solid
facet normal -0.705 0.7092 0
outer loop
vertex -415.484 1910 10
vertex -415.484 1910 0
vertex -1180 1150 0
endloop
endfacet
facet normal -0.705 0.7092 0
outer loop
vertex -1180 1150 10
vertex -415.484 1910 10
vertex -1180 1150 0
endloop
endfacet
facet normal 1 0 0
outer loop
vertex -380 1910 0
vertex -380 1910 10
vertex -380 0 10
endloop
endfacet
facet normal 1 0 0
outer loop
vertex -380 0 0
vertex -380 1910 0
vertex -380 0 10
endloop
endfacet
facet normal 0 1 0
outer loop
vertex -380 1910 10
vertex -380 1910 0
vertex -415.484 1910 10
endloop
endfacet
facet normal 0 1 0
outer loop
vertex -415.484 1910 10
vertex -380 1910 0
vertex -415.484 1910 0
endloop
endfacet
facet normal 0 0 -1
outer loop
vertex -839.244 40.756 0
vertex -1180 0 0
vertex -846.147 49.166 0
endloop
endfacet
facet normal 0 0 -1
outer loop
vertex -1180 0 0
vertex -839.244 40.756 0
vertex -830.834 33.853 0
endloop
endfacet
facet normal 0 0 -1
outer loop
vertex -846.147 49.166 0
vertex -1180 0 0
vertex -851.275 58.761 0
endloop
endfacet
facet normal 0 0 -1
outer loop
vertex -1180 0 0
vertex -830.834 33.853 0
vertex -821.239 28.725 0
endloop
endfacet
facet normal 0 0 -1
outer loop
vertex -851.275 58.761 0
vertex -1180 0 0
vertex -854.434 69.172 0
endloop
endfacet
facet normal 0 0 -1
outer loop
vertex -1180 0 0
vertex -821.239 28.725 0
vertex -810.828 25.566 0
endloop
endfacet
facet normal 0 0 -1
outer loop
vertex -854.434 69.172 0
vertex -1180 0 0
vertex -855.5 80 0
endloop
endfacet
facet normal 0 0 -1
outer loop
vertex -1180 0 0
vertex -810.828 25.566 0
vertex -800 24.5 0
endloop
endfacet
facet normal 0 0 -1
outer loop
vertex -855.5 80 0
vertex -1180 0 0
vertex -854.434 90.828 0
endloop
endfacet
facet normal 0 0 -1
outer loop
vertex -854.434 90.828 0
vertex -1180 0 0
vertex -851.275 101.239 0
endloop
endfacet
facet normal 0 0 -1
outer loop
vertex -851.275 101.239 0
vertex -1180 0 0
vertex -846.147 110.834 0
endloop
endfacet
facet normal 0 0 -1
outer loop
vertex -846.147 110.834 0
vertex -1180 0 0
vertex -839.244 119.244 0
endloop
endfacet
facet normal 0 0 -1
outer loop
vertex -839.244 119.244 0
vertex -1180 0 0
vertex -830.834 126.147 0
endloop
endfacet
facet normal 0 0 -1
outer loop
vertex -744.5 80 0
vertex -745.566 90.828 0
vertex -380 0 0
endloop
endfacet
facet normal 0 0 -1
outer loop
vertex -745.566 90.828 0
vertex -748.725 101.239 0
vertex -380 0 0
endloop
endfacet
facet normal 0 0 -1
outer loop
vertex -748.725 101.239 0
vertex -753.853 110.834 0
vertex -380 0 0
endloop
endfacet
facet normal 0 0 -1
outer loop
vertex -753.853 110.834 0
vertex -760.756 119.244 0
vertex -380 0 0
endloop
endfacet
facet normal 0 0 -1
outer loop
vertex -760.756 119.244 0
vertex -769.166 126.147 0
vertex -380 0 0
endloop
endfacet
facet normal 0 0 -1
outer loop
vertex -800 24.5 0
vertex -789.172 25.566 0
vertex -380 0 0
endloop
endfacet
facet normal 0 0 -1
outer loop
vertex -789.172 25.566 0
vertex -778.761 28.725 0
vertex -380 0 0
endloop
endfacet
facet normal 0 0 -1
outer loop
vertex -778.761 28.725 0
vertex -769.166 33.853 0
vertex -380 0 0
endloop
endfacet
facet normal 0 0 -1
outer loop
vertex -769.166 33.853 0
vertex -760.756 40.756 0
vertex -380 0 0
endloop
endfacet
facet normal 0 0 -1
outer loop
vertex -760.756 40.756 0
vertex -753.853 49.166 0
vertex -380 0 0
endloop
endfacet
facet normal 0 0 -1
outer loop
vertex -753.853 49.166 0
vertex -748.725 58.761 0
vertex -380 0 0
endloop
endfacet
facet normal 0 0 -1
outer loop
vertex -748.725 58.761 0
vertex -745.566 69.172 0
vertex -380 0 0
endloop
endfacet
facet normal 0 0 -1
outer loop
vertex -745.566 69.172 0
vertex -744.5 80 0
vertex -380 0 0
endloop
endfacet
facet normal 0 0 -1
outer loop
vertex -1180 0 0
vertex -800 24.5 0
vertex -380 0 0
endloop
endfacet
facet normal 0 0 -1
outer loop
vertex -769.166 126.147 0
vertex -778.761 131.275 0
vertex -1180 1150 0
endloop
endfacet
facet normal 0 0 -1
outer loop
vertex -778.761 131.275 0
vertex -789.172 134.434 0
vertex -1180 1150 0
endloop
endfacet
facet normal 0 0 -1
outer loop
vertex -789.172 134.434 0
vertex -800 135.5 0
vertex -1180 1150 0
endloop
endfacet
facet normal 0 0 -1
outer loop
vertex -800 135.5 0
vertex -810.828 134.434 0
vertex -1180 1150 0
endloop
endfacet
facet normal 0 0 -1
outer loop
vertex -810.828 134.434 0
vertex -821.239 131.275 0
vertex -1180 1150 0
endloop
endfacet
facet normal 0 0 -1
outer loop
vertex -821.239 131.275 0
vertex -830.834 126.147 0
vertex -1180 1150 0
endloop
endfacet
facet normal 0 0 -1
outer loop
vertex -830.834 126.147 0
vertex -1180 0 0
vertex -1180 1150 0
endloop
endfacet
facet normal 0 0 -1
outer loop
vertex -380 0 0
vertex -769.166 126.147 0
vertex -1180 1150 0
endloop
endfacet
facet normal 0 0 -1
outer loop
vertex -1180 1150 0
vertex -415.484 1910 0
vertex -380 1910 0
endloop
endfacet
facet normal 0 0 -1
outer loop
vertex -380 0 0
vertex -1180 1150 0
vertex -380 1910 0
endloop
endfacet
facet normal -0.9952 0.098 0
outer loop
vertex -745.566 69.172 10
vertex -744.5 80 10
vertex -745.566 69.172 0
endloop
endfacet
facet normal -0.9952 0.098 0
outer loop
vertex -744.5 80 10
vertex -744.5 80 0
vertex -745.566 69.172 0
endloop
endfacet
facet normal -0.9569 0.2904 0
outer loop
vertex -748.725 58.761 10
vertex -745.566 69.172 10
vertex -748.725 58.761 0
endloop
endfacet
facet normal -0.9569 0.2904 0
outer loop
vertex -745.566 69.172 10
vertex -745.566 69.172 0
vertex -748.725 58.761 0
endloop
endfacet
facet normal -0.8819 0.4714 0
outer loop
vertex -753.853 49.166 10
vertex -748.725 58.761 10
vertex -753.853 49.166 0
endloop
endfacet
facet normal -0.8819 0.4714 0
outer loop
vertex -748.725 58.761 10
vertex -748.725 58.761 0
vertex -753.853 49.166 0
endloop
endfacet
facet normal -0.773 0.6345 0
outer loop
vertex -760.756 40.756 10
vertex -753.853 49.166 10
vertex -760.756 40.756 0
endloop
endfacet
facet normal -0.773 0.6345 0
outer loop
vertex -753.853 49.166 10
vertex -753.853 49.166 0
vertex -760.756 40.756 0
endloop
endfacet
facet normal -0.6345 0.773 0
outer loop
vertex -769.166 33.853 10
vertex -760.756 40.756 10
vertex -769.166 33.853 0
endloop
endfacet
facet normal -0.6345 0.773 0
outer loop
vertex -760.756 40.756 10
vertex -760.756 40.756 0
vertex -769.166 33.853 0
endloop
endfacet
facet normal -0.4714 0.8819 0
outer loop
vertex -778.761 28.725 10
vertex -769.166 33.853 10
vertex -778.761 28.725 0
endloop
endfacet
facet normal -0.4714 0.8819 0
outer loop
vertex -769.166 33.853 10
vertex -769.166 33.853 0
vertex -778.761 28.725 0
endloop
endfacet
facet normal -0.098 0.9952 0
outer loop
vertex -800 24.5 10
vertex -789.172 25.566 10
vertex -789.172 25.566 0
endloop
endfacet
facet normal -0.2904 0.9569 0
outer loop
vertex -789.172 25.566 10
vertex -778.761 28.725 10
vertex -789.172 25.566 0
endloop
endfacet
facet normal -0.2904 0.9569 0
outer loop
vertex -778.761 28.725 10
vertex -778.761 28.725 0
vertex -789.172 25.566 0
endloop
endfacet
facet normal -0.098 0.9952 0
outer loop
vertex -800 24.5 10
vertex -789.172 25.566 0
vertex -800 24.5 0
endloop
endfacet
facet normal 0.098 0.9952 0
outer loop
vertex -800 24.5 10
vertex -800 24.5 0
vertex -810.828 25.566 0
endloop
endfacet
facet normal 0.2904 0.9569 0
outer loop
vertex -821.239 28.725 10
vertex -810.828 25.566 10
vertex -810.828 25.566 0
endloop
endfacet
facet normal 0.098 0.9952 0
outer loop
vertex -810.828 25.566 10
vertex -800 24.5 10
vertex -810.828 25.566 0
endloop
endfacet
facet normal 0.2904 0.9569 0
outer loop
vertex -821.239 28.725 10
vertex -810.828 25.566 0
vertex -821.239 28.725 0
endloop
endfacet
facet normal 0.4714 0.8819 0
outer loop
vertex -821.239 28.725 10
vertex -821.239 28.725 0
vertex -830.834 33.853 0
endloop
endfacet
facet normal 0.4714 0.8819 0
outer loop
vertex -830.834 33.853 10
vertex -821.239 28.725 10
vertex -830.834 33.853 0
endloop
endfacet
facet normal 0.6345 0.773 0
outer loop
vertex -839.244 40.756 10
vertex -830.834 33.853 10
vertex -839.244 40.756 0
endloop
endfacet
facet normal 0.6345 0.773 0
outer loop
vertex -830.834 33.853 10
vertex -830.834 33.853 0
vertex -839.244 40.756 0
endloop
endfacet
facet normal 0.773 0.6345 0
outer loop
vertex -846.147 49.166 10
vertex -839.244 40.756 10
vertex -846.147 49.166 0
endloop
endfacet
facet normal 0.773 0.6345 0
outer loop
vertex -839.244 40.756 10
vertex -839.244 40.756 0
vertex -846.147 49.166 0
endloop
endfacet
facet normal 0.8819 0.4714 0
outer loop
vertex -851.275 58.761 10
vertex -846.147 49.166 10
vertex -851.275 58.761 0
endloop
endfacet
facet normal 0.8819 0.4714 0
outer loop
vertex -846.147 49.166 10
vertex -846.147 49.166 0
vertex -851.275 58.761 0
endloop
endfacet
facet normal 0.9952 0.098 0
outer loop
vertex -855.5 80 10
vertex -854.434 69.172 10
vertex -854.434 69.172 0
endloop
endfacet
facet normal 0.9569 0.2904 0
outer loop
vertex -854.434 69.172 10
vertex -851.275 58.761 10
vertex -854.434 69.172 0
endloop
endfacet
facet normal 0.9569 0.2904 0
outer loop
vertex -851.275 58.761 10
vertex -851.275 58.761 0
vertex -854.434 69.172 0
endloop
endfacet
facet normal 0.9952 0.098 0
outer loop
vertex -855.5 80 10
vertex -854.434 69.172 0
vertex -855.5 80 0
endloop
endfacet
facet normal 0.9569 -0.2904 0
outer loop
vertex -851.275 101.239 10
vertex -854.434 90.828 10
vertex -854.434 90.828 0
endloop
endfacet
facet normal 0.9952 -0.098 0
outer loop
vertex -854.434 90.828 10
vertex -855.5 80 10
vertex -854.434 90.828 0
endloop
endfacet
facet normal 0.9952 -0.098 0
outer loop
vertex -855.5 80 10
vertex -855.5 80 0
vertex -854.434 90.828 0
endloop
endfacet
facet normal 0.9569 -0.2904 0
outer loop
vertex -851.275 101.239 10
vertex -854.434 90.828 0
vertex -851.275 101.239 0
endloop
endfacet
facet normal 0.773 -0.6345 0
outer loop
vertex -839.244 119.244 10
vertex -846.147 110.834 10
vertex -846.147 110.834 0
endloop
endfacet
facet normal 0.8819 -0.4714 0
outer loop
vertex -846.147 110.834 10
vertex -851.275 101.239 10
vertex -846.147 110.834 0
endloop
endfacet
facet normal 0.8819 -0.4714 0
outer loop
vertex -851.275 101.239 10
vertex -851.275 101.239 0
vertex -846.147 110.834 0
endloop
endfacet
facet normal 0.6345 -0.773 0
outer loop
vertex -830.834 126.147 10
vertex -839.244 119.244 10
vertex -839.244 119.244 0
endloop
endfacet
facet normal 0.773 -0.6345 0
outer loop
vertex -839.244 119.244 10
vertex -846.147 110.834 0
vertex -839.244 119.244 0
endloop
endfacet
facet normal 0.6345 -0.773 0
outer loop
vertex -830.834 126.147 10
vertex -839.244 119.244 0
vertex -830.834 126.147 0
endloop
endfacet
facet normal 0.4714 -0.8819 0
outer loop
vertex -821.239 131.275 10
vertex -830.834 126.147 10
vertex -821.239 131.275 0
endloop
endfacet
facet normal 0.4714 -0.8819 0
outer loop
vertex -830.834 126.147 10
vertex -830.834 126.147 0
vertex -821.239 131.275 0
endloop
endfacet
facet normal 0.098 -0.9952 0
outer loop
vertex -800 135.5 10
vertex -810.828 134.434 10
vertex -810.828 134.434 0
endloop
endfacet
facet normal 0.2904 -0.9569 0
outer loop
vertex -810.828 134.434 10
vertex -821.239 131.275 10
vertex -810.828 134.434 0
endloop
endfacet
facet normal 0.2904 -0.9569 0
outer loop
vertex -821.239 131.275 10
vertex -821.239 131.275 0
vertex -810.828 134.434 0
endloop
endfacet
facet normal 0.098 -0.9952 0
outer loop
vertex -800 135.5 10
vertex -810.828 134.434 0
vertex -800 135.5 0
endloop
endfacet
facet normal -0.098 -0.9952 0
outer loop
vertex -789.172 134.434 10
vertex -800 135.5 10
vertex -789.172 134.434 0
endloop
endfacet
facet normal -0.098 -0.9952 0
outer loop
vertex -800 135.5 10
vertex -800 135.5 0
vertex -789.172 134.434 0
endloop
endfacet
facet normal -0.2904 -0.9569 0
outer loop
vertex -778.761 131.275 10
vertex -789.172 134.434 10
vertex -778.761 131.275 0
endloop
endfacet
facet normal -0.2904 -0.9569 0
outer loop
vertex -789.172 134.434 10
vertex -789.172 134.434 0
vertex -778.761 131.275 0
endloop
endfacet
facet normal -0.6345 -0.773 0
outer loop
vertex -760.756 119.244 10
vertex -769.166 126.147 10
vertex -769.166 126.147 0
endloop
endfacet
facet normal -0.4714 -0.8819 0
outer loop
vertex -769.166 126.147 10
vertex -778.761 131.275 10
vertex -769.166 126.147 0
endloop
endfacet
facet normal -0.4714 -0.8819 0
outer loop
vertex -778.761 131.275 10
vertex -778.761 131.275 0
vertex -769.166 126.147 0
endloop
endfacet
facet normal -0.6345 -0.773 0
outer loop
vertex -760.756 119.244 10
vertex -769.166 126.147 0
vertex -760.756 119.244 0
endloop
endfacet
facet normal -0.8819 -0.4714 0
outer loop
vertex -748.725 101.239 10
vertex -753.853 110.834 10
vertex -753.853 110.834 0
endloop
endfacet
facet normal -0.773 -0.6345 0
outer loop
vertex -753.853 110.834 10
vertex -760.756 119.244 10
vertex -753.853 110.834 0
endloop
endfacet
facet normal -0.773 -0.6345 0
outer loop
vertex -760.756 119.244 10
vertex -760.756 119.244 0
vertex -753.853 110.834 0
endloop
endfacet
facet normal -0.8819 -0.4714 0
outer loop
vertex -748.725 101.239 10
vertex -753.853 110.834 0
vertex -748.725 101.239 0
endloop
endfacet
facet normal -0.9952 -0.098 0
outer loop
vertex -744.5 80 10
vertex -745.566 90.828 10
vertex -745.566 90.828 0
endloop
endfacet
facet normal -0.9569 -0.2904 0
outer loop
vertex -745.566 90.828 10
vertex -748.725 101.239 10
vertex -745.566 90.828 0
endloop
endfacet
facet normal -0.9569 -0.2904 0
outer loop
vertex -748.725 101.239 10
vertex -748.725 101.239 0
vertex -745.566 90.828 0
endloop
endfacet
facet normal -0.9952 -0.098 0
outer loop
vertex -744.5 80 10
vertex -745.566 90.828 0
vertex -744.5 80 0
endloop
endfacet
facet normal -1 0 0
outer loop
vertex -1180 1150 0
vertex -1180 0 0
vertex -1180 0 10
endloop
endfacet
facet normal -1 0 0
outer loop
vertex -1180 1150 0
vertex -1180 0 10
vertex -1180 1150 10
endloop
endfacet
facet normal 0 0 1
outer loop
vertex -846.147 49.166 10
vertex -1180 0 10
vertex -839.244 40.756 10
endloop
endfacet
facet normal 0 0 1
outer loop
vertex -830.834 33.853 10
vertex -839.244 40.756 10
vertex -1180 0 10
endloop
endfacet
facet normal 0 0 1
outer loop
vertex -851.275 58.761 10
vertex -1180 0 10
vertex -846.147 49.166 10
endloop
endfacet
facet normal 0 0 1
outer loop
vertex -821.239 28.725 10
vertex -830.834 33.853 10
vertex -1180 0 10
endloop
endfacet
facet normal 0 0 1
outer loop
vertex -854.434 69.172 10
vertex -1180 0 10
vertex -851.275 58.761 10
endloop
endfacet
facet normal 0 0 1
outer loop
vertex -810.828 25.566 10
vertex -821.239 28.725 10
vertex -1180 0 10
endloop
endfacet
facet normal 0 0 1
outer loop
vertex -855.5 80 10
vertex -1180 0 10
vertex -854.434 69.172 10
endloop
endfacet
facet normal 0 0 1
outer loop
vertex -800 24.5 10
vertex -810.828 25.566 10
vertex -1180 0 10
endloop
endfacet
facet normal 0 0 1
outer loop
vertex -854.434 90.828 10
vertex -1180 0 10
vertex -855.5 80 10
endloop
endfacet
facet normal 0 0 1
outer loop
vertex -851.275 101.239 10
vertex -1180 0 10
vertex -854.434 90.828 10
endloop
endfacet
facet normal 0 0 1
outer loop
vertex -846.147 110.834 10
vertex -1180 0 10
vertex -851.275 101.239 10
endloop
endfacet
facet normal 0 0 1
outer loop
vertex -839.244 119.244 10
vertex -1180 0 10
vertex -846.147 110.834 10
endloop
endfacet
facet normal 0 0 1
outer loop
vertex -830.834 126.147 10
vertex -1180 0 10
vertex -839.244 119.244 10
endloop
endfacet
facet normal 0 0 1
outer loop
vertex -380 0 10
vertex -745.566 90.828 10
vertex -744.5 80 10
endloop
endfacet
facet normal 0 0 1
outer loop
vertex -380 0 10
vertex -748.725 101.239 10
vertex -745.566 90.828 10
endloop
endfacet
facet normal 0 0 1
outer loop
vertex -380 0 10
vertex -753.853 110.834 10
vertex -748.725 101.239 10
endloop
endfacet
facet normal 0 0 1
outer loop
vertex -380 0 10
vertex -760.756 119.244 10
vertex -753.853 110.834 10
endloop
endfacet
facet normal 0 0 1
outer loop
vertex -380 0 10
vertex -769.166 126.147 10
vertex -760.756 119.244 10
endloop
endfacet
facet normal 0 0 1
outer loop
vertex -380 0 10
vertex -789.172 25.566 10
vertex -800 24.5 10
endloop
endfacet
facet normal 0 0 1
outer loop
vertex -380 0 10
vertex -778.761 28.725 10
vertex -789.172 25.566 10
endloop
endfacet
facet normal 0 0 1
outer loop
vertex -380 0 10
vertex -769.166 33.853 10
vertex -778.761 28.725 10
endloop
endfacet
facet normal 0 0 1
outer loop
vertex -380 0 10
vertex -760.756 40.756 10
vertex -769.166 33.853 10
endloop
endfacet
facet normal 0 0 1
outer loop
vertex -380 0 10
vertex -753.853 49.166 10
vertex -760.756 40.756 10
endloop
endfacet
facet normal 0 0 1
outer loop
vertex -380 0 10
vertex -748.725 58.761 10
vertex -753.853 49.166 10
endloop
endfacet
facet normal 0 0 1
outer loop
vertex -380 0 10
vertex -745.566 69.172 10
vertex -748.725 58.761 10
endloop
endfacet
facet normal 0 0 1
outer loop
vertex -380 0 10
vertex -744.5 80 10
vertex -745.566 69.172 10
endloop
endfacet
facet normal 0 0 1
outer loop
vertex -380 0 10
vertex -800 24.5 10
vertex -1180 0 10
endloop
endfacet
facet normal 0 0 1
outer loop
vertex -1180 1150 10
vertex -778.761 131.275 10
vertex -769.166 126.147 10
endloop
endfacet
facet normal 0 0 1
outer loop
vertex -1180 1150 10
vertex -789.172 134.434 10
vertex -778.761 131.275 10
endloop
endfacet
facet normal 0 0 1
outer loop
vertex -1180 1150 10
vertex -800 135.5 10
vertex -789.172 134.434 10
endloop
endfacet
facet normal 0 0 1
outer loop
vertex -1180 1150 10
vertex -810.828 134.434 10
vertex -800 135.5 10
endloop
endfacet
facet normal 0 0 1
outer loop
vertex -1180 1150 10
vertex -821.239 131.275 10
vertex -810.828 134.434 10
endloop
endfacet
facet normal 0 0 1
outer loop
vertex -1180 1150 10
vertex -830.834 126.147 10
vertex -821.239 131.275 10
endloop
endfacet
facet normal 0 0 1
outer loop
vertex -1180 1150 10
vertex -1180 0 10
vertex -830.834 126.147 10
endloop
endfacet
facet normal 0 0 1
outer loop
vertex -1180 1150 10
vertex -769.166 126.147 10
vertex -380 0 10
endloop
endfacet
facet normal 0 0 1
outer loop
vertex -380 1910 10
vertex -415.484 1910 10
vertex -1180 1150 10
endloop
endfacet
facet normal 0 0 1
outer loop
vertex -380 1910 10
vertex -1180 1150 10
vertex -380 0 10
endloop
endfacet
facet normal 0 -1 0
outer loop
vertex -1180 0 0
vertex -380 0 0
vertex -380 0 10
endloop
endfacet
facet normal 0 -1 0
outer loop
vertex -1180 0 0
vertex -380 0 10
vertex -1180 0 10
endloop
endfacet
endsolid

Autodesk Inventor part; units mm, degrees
ref_plane "YZ Plane" through (0, 0, 0) normal (1, 0, 0) x (0, 1, 0)
ref_plane "XZ Plane" through (0, 0, 0) normal (0, 1, 0) x (-1, 0, 0)
ref_plane "XY Plane" through (0, 0, 0) normal (0, 0, 1) x (1, 0, 0)
sketch "Sketch1" plane through (0, 0, 0) normal (0, 0, 1) x (1, 0, 0)
  line L0 (0, 0) -> (0, 1910) construction
  line L1 (424.5155, 1910) -> (-415.4845, 1910)
  line L2 (-415.4845, 1910) -> (-1180, 1150)
  line L3 (-1180, 0) -> (-1180, 1150)
  line L4 (960, 0) -> (960, 1342.8524)
  line L5 (424.5155, 1910) -> (960, 1342.8524)
  circle A0 centre (0, 950) radius 265 construction
  line L6 (960, 0) -> (-1180, 0)
  circle A1 centre (-1701.6377, -269.2167) radius 188.5 construction
  circle A2 centre (-800, 80) radius 55.5
  circle A3 centre (0, 950) radius 170
  line L7 (0, 1215) -> (0, 1120) construction
  line L8 (-721.2646, 955) -> (721.2646, 955) construction
  line L9 (-169.9265, 955) -> (-174.9265, 955) construction
  line L10 (-174.9265, 960) -> (-174.9265, 950)
  line L11 (-174.9265, 960) -> (-169.7056, 960)
  line L12 (-174.9265, 950) -> (-170, 950)
  line L13 (169.9265, 955) -> (174.9265, 955) construction
  line L14 (174.9265, 960) -> (174.9265, 950)
  line L15 (169.7056, 960) -> (174.9265, 960)
  line L16 (174.9265, 950) -> (170, 950)
  line L17 (-174.9265, 970) -> (174.9265, 970)
  line L18 (174.9265, 970) -> (174.9265, 940)
  line L19 (174.9265, 940) -> (-174.9265, 940)
  line L20 (-174.9265, 940) -> (-174.9265, 970)
  arc A4 (-2.4999, 780.0184) -> (2.4999, 780.0184) centre (0, 780) ccw
  arc A5 (2.4999, 1119.9816) -> (-2.4999, 1119.9816) centre (0, 1120) ccw
  point P0 (0, 955)
  point P1 (-169.7056, 940)
  point P2 (169.7056, 940)
  point P3 (168.8194, 970)
  point P4 (-168.8194, 970)
  dimension "d52" = 530
  dimension "d72" = 340
  dimension "d1" = 840
  dimension "d3" = 1150
  dimension "d12" = 1180
  dimension "d13" = 950
  dimension "d14" = 111
  dimension "d15" = 1910
  dimension "d17" = -521.6377
  dimension "d18" = 377
  dimension "d19" = -269.2167
  dimension "d34" = 380
  dimension "d35" = 80
  dimension "d37" = 2140
  dimension "d53" = 5
  dimension "d54" = 10
  dimension "d55" = 30
  dimension "d67" = 5
  dimension "d68" = 5
  dimension "d69" = 780
  dimension "d71" = 1078
extrude "Extrusion1" add sketch "Sketch1" along normal blind 10 contours L5 L4 L6 L3 L2 L1 | A3 L19 L17 | L16 L18 L19 A3 | A3 L15 L14 L16 | A3 L17 L18 L15 | L19 L20 L12 A3 | A3 L11 L20 L17 | L12 L10 L11 A3
fillet "Fillet1" radius 10 4 edges at (-168.8194, 970, 5) (-169.7056, 940, 5) (168.8194, 970, 5) (169.7056, 940, 5)
sketch "Sketch4" plane through (0, 0, 0) normal (0, 0, 1) x (1, 0, 0)
  circle A0 centre (-51.6989, 1209.9081) radius 6.5
  arc A1 (-2.4999, 1119.9816) -> (-166.985, 981.875) centre (0, 950) ccw projected
  line L0 (0, 950) -> (0, 1196.7062) construction
  line L1 (-51.6989, 1209.9081) -> (0, 950) construction
  point P0 (0, 0)
  point P1 (-5, 1149.9375)
  dimension "d59" = 265
  dimension "d60" = 13
  dimension "d61" = 11.25
extrude "Extrusion4" cut sketch "Sketch4" along normal blind 10
pattern_circular "Circular Pattern3" count 16 over 360 about axis through (0, 950, 0) along (0, 0, 1) of "Extrusion4"
sketch "Sketch5" plane through (0, 0, 10) normal (0, 0, 1) x (1, 0, 0)
  circle A0 centre (51.6989, 1209.9081) radius 6.5 projected
  circle A1 centre (147.2261, 1170.3394) radius 6.5 projected
  circle A2 centre (220.3394, 1097.2261) radius 6.5 projected
  circle A3 centre (259.9081, 1001.6989) radius 6.5 projected
  circle A4 centre (259.9081, 898.3011) radius 6.5 projected
  circle A5 centre (220.3394, 802.7739) radius 6.5 projected
  circle A6 centre (147.2261, 729.6606) radius 6.5 projected
  circle A7 centre (51.6989, 690.0919) radius 6.5 projected
  circle A8 centre (-51.6989, 690.0919) radius 6.5 projected
  circle A9 centre (-147.2261, 729.6606) radius 6.5 projected
  circle A10 centre (-220.3394, 802.7739) radius 6.5 projected
  circle A11 centre (-259.9081, 898.3011) radius 6.5 projected
  circle A12 centre (-259.9081, 1001.6989) radius 6.5 projected
  circle A13 centre (-220.3394, 1097.2261) radius 6.5 projected
  circle A14 centre (-147.2261, 1170.3394) radius 6.5 projected
  circle A15 centre (-51.6989, 1209.9081) radius 6.5 projected
  line L0 (960, 1342.8524) -> (424.5155, 1910) projected
  line L1 (424.5155, 1910) -> (-415.4845, 1910) projected
  line L2 (-415.4845, 1910) -> (-1180, 1150) projected
  line L3 (-1180, 1150) -> (-1180, 0) projected
  line L4 (-1180, 0) -> (960, 0) projected
  line L5 (960, 0) -> (960, 1342.8524) projected
  arc A16 (2.4999, 780.0184) -> (168.6666, 928.75) centre (0, 950) ccw projected
  arc A17 (-2.4999, 780.0184) -> (2.4999, 780.0184) centre (0, 780) ccw projected
  arc A18 (-168.6666, 928.75) -> (-2.4999, 780.0184) centre (0, 950) ccw projected
  arc A19 (-158.7451, 940) -> (-168.6666, 928.75) centre (-158.7451, 930) ccw projected
  line L6 (-158.7451, 940) -> (158.7451, 940) projected
  arc A20 (168.6666, 928.75) -> (158.7451, 940) centre (158.7451, 930) ccw projected
  circle A21 centre (-800, 80) radius 55.5 projected
  line L7 (157.1623, 970) -> (-157.1623, 970) projected
  arc A22 (-166.985, 981.875) -> (-157.1623, 970) centre (-157.1623, 980) ccw projected
  arc A23 (-2.4999, 1119.9816) -> (-166.985, 981.875) centre (0, 950) ccw projected
  arc A24 (2.4999, 1119.9816) -> (-2.4999, 1119.9816) centre (0, 1120) ccw projected
  arc A25 (166.985, 981.875) -> (2.4999, 1119.9816) centre (0, 950) ccw projected
  arc A26 (157.1623, 970) -> (166.985, 981.875) centre (157.1623, 980) ccw projected
  line L8 (424.5155, 1910) -> (-415.4845, 1910) projected
  line L9 (-380, 1910) -> (-380, 0)
  point P0 (0, 0)
  dimension "d73" = 1340
extrude "Extrusion5" cut sketch "Sketch5" against normal through all contours L5 L4 L9 L1 L0
properties part number "ДМФ 011 Стенка Корма ЛЕВ"
